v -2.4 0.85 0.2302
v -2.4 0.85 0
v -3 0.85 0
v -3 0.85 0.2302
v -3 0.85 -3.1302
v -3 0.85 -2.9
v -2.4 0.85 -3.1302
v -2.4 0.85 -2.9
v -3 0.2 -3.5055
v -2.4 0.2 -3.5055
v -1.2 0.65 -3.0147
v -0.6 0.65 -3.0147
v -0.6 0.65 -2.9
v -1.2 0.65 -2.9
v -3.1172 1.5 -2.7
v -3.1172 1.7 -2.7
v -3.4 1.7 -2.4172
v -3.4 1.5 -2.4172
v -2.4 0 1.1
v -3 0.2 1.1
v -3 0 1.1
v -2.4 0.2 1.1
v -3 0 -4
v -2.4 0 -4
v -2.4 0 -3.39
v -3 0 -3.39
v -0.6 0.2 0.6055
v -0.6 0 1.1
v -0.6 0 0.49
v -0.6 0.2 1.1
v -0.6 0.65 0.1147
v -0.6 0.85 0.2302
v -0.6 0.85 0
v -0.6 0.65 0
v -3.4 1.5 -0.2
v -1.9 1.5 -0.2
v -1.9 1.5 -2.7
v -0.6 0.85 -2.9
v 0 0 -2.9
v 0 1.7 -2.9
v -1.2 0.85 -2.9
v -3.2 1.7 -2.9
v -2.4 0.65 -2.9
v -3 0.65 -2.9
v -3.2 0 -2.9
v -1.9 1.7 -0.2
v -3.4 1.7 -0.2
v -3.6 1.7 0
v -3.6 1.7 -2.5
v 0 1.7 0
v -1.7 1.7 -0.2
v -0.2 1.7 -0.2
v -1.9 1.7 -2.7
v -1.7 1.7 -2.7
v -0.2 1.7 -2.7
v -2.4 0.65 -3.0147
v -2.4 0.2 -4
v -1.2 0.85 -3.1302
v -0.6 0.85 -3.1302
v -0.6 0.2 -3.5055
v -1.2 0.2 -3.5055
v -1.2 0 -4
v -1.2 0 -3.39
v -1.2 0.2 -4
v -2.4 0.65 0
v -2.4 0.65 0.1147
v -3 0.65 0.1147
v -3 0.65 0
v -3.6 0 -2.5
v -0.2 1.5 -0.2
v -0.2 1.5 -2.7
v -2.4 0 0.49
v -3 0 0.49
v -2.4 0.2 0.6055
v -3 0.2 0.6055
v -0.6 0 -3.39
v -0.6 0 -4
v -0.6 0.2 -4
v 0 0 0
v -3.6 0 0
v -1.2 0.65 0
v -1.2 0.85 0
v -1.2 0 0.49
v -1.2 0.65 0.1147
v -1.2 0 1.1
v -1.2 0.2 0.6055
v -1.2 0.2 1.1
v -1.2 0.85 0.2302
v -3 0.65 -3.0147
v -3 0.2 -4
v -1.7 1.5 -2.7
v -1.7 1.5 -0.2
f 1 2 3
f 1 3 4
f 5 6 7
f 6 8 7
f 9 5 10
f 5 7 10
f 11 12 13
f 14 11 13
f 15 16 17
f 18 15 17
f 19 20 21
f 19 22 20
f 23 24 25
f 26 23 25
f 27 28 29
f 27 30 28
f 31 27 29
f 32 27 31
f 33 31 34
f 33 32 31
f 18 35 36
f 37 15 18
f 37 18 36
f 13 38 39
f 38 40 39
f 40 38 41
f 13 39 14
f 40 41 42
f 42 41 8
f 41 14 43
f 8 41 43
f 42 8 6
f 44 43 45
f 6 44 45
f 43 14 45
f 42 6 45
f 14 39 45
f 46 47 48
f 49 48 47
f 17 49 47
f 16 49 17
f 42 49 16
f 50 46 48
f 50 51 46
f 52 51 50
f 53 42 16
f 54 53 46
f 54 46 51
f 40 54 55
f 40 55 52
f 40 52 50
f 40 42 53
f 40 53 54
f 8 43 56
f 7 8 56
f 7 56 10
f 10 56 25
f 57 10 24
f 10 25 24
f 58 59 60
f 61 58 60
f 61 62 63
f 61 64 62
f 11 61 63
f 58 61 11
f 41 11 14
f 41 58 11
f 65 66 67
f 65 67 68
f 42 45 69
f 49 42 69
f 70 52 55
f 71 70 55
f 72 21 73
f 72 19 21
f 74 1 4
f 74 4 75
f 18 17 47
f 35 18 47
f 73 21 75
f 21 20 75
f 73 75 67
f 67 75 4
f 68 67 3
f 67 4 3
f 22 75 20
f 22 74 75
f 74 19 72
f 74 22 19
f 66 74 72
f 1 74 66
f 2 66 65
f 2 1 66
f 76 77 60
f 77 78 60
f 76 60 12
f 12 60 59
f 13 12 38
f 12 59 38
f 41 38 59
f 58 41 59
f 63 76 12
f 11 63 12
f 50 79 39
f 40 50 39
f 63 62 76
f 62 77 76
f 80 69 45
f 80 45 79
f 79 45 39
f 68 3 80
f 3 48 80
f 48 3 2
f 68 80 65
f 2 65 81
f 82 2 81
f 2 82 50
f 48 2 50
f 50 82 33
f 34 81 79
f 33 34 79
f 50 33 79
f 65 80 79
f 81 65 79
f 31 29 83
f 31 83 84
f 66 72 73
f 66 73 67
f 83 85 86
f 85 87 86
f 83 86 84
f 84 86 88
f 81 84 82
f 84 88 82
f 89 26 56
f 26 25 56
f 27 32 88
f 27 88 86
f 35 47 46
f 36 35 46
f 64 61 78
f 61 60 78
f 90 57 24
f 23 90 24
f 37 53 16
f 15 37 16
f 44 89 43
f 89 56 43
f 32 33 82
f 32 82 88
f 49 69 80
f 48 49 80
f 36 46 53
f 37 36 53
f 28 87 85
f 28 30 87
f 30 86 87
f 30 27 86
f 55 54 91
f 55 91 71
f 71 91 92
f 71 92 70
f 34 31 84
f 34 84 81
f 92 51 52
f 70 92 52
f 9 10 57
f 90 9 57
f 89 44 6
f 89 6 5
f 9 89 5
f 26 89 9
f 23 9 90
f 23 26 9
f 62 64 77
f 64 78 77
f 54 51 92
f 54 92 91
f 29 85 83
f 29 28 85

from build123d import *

# Parameters (mm, degrees)
BASE_DEPTH           = 1.7
SKETCH2_W            = 1.5
SKETCH2_H            = 2.5
SENSOR_INDENTS_DEPTH = 0.2
FOOT_DEPTH           = 0.3
FEET_COUNT           = 2
FEET_PITCH           = 1.8
FEETS_COPY_1_DEPTH   = 0.3


with BuildPart() as part:
    # Sketch1 → Base (new body)
    with BuildSketch(Plane(origin=(0, 0, 0), x_dir=(1, 0, 0), z_dir=(0, 1, 0))):
        Polygon((-3.2, 2.9), (-3.6, 2.5), (-3.6, 0), (0, 0), (0, 2.9), align=None)
    extrude(amount=BASE_DEPTH)

    # Sketch2 → Sensor Indents (cut)
    with BuildSketch(Plane(origin=(0, 1.7, 0), x_dir=(1, 0, 0), z_dir=(0, 1, 0))):
        with Locations((-0.95, 1.45)):
            Rectangle(SKETCH2_W, SKETCH2_H)
        Polygon((-1.9, 0.2), (-1.9, 2.7), (-3.117157288, 2.7), (-3.4, 2.417157288), (-3.4, 0.2), align=None)
    extrude(amount=-SENSOR_INDENTS_DEPTH, mode=Mode.SUBTRACT)

    # Sketch3 → Foot (add, symmetric)
    with BuildSketch(Plane(origin=(-0.9, 0, 0), x_dir=(0, 0, -1), z_dir=(1, 0, 0))):
        Polygon((-1.1, 0), (-0.49, 0), (-0.114722325, 0.65), (0, 0.65), (0, 0.85), (-0.230192379, 0.85), (-0.605470054, 0.2), (-1.1, 0.2), align=None)
    foot = extrude(amount=FOOT_DEPTH, both=True)

    # Feet: Foot ×2
    with Locations(*[(-i * FEET_PITCH, 0, 0) for i in range(1, FEET_COUNT)]):
        add(foot)

    # Feets: Foot across plane
    add(foot.mirror(Plane.XY.offset(-1.45)))

    # Feets copy 1 sketch → Feets copy 1 (add, symmetric)
    with BuildSketch(Plane(origin=(-2.7, 0, -2.9), x_dir=(0, 0, 1), z_dir=(1, 0, 0))):
        Polygon((-1.1, 0), (-0.49, 0), (-0.114722325, -0.65), (0, -0.65), (0, -0.85), (-0.230192379, -0.85), (-0.605470054, -0.2), (-1.1, -0.2), align=None)
    extrude(amount=FEETS_COPY_1_DEPTH, both=True)


solid = part.part
